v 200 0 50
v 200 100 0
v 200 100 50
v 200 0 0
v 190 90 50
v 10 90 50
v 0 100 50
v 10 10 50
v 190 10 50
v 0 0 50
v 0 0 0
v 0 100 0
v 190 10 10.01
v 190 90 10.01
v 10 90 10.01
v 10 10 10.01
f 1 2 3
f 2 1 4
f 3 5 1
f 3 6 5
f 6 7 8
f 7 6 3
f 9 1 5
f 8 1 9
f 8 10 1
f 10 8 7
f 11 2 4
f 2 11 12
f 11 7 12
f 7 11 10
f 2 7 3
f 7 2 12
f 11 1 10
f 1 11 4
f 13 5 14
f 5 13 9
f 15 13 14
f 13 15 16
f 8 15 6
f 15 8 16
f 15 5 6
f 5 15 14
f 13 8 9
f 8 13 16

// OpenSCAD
FEEDER_WIDTH = 200;
FEEDER_HEIGHT = 50;
FEEDER_DEPTH = 100;


difference() {
    cube([FEEDER_WIDTH, FEEDER_DEPTH, FEEDER_HEIGHT]);
    translate([10, 10, 10.01]) {
        cube([FEEDER_WIDTH - 20, FEEDER_DEPTH - 20, FEEDER_HEIGHT - 10]);
    }
}
